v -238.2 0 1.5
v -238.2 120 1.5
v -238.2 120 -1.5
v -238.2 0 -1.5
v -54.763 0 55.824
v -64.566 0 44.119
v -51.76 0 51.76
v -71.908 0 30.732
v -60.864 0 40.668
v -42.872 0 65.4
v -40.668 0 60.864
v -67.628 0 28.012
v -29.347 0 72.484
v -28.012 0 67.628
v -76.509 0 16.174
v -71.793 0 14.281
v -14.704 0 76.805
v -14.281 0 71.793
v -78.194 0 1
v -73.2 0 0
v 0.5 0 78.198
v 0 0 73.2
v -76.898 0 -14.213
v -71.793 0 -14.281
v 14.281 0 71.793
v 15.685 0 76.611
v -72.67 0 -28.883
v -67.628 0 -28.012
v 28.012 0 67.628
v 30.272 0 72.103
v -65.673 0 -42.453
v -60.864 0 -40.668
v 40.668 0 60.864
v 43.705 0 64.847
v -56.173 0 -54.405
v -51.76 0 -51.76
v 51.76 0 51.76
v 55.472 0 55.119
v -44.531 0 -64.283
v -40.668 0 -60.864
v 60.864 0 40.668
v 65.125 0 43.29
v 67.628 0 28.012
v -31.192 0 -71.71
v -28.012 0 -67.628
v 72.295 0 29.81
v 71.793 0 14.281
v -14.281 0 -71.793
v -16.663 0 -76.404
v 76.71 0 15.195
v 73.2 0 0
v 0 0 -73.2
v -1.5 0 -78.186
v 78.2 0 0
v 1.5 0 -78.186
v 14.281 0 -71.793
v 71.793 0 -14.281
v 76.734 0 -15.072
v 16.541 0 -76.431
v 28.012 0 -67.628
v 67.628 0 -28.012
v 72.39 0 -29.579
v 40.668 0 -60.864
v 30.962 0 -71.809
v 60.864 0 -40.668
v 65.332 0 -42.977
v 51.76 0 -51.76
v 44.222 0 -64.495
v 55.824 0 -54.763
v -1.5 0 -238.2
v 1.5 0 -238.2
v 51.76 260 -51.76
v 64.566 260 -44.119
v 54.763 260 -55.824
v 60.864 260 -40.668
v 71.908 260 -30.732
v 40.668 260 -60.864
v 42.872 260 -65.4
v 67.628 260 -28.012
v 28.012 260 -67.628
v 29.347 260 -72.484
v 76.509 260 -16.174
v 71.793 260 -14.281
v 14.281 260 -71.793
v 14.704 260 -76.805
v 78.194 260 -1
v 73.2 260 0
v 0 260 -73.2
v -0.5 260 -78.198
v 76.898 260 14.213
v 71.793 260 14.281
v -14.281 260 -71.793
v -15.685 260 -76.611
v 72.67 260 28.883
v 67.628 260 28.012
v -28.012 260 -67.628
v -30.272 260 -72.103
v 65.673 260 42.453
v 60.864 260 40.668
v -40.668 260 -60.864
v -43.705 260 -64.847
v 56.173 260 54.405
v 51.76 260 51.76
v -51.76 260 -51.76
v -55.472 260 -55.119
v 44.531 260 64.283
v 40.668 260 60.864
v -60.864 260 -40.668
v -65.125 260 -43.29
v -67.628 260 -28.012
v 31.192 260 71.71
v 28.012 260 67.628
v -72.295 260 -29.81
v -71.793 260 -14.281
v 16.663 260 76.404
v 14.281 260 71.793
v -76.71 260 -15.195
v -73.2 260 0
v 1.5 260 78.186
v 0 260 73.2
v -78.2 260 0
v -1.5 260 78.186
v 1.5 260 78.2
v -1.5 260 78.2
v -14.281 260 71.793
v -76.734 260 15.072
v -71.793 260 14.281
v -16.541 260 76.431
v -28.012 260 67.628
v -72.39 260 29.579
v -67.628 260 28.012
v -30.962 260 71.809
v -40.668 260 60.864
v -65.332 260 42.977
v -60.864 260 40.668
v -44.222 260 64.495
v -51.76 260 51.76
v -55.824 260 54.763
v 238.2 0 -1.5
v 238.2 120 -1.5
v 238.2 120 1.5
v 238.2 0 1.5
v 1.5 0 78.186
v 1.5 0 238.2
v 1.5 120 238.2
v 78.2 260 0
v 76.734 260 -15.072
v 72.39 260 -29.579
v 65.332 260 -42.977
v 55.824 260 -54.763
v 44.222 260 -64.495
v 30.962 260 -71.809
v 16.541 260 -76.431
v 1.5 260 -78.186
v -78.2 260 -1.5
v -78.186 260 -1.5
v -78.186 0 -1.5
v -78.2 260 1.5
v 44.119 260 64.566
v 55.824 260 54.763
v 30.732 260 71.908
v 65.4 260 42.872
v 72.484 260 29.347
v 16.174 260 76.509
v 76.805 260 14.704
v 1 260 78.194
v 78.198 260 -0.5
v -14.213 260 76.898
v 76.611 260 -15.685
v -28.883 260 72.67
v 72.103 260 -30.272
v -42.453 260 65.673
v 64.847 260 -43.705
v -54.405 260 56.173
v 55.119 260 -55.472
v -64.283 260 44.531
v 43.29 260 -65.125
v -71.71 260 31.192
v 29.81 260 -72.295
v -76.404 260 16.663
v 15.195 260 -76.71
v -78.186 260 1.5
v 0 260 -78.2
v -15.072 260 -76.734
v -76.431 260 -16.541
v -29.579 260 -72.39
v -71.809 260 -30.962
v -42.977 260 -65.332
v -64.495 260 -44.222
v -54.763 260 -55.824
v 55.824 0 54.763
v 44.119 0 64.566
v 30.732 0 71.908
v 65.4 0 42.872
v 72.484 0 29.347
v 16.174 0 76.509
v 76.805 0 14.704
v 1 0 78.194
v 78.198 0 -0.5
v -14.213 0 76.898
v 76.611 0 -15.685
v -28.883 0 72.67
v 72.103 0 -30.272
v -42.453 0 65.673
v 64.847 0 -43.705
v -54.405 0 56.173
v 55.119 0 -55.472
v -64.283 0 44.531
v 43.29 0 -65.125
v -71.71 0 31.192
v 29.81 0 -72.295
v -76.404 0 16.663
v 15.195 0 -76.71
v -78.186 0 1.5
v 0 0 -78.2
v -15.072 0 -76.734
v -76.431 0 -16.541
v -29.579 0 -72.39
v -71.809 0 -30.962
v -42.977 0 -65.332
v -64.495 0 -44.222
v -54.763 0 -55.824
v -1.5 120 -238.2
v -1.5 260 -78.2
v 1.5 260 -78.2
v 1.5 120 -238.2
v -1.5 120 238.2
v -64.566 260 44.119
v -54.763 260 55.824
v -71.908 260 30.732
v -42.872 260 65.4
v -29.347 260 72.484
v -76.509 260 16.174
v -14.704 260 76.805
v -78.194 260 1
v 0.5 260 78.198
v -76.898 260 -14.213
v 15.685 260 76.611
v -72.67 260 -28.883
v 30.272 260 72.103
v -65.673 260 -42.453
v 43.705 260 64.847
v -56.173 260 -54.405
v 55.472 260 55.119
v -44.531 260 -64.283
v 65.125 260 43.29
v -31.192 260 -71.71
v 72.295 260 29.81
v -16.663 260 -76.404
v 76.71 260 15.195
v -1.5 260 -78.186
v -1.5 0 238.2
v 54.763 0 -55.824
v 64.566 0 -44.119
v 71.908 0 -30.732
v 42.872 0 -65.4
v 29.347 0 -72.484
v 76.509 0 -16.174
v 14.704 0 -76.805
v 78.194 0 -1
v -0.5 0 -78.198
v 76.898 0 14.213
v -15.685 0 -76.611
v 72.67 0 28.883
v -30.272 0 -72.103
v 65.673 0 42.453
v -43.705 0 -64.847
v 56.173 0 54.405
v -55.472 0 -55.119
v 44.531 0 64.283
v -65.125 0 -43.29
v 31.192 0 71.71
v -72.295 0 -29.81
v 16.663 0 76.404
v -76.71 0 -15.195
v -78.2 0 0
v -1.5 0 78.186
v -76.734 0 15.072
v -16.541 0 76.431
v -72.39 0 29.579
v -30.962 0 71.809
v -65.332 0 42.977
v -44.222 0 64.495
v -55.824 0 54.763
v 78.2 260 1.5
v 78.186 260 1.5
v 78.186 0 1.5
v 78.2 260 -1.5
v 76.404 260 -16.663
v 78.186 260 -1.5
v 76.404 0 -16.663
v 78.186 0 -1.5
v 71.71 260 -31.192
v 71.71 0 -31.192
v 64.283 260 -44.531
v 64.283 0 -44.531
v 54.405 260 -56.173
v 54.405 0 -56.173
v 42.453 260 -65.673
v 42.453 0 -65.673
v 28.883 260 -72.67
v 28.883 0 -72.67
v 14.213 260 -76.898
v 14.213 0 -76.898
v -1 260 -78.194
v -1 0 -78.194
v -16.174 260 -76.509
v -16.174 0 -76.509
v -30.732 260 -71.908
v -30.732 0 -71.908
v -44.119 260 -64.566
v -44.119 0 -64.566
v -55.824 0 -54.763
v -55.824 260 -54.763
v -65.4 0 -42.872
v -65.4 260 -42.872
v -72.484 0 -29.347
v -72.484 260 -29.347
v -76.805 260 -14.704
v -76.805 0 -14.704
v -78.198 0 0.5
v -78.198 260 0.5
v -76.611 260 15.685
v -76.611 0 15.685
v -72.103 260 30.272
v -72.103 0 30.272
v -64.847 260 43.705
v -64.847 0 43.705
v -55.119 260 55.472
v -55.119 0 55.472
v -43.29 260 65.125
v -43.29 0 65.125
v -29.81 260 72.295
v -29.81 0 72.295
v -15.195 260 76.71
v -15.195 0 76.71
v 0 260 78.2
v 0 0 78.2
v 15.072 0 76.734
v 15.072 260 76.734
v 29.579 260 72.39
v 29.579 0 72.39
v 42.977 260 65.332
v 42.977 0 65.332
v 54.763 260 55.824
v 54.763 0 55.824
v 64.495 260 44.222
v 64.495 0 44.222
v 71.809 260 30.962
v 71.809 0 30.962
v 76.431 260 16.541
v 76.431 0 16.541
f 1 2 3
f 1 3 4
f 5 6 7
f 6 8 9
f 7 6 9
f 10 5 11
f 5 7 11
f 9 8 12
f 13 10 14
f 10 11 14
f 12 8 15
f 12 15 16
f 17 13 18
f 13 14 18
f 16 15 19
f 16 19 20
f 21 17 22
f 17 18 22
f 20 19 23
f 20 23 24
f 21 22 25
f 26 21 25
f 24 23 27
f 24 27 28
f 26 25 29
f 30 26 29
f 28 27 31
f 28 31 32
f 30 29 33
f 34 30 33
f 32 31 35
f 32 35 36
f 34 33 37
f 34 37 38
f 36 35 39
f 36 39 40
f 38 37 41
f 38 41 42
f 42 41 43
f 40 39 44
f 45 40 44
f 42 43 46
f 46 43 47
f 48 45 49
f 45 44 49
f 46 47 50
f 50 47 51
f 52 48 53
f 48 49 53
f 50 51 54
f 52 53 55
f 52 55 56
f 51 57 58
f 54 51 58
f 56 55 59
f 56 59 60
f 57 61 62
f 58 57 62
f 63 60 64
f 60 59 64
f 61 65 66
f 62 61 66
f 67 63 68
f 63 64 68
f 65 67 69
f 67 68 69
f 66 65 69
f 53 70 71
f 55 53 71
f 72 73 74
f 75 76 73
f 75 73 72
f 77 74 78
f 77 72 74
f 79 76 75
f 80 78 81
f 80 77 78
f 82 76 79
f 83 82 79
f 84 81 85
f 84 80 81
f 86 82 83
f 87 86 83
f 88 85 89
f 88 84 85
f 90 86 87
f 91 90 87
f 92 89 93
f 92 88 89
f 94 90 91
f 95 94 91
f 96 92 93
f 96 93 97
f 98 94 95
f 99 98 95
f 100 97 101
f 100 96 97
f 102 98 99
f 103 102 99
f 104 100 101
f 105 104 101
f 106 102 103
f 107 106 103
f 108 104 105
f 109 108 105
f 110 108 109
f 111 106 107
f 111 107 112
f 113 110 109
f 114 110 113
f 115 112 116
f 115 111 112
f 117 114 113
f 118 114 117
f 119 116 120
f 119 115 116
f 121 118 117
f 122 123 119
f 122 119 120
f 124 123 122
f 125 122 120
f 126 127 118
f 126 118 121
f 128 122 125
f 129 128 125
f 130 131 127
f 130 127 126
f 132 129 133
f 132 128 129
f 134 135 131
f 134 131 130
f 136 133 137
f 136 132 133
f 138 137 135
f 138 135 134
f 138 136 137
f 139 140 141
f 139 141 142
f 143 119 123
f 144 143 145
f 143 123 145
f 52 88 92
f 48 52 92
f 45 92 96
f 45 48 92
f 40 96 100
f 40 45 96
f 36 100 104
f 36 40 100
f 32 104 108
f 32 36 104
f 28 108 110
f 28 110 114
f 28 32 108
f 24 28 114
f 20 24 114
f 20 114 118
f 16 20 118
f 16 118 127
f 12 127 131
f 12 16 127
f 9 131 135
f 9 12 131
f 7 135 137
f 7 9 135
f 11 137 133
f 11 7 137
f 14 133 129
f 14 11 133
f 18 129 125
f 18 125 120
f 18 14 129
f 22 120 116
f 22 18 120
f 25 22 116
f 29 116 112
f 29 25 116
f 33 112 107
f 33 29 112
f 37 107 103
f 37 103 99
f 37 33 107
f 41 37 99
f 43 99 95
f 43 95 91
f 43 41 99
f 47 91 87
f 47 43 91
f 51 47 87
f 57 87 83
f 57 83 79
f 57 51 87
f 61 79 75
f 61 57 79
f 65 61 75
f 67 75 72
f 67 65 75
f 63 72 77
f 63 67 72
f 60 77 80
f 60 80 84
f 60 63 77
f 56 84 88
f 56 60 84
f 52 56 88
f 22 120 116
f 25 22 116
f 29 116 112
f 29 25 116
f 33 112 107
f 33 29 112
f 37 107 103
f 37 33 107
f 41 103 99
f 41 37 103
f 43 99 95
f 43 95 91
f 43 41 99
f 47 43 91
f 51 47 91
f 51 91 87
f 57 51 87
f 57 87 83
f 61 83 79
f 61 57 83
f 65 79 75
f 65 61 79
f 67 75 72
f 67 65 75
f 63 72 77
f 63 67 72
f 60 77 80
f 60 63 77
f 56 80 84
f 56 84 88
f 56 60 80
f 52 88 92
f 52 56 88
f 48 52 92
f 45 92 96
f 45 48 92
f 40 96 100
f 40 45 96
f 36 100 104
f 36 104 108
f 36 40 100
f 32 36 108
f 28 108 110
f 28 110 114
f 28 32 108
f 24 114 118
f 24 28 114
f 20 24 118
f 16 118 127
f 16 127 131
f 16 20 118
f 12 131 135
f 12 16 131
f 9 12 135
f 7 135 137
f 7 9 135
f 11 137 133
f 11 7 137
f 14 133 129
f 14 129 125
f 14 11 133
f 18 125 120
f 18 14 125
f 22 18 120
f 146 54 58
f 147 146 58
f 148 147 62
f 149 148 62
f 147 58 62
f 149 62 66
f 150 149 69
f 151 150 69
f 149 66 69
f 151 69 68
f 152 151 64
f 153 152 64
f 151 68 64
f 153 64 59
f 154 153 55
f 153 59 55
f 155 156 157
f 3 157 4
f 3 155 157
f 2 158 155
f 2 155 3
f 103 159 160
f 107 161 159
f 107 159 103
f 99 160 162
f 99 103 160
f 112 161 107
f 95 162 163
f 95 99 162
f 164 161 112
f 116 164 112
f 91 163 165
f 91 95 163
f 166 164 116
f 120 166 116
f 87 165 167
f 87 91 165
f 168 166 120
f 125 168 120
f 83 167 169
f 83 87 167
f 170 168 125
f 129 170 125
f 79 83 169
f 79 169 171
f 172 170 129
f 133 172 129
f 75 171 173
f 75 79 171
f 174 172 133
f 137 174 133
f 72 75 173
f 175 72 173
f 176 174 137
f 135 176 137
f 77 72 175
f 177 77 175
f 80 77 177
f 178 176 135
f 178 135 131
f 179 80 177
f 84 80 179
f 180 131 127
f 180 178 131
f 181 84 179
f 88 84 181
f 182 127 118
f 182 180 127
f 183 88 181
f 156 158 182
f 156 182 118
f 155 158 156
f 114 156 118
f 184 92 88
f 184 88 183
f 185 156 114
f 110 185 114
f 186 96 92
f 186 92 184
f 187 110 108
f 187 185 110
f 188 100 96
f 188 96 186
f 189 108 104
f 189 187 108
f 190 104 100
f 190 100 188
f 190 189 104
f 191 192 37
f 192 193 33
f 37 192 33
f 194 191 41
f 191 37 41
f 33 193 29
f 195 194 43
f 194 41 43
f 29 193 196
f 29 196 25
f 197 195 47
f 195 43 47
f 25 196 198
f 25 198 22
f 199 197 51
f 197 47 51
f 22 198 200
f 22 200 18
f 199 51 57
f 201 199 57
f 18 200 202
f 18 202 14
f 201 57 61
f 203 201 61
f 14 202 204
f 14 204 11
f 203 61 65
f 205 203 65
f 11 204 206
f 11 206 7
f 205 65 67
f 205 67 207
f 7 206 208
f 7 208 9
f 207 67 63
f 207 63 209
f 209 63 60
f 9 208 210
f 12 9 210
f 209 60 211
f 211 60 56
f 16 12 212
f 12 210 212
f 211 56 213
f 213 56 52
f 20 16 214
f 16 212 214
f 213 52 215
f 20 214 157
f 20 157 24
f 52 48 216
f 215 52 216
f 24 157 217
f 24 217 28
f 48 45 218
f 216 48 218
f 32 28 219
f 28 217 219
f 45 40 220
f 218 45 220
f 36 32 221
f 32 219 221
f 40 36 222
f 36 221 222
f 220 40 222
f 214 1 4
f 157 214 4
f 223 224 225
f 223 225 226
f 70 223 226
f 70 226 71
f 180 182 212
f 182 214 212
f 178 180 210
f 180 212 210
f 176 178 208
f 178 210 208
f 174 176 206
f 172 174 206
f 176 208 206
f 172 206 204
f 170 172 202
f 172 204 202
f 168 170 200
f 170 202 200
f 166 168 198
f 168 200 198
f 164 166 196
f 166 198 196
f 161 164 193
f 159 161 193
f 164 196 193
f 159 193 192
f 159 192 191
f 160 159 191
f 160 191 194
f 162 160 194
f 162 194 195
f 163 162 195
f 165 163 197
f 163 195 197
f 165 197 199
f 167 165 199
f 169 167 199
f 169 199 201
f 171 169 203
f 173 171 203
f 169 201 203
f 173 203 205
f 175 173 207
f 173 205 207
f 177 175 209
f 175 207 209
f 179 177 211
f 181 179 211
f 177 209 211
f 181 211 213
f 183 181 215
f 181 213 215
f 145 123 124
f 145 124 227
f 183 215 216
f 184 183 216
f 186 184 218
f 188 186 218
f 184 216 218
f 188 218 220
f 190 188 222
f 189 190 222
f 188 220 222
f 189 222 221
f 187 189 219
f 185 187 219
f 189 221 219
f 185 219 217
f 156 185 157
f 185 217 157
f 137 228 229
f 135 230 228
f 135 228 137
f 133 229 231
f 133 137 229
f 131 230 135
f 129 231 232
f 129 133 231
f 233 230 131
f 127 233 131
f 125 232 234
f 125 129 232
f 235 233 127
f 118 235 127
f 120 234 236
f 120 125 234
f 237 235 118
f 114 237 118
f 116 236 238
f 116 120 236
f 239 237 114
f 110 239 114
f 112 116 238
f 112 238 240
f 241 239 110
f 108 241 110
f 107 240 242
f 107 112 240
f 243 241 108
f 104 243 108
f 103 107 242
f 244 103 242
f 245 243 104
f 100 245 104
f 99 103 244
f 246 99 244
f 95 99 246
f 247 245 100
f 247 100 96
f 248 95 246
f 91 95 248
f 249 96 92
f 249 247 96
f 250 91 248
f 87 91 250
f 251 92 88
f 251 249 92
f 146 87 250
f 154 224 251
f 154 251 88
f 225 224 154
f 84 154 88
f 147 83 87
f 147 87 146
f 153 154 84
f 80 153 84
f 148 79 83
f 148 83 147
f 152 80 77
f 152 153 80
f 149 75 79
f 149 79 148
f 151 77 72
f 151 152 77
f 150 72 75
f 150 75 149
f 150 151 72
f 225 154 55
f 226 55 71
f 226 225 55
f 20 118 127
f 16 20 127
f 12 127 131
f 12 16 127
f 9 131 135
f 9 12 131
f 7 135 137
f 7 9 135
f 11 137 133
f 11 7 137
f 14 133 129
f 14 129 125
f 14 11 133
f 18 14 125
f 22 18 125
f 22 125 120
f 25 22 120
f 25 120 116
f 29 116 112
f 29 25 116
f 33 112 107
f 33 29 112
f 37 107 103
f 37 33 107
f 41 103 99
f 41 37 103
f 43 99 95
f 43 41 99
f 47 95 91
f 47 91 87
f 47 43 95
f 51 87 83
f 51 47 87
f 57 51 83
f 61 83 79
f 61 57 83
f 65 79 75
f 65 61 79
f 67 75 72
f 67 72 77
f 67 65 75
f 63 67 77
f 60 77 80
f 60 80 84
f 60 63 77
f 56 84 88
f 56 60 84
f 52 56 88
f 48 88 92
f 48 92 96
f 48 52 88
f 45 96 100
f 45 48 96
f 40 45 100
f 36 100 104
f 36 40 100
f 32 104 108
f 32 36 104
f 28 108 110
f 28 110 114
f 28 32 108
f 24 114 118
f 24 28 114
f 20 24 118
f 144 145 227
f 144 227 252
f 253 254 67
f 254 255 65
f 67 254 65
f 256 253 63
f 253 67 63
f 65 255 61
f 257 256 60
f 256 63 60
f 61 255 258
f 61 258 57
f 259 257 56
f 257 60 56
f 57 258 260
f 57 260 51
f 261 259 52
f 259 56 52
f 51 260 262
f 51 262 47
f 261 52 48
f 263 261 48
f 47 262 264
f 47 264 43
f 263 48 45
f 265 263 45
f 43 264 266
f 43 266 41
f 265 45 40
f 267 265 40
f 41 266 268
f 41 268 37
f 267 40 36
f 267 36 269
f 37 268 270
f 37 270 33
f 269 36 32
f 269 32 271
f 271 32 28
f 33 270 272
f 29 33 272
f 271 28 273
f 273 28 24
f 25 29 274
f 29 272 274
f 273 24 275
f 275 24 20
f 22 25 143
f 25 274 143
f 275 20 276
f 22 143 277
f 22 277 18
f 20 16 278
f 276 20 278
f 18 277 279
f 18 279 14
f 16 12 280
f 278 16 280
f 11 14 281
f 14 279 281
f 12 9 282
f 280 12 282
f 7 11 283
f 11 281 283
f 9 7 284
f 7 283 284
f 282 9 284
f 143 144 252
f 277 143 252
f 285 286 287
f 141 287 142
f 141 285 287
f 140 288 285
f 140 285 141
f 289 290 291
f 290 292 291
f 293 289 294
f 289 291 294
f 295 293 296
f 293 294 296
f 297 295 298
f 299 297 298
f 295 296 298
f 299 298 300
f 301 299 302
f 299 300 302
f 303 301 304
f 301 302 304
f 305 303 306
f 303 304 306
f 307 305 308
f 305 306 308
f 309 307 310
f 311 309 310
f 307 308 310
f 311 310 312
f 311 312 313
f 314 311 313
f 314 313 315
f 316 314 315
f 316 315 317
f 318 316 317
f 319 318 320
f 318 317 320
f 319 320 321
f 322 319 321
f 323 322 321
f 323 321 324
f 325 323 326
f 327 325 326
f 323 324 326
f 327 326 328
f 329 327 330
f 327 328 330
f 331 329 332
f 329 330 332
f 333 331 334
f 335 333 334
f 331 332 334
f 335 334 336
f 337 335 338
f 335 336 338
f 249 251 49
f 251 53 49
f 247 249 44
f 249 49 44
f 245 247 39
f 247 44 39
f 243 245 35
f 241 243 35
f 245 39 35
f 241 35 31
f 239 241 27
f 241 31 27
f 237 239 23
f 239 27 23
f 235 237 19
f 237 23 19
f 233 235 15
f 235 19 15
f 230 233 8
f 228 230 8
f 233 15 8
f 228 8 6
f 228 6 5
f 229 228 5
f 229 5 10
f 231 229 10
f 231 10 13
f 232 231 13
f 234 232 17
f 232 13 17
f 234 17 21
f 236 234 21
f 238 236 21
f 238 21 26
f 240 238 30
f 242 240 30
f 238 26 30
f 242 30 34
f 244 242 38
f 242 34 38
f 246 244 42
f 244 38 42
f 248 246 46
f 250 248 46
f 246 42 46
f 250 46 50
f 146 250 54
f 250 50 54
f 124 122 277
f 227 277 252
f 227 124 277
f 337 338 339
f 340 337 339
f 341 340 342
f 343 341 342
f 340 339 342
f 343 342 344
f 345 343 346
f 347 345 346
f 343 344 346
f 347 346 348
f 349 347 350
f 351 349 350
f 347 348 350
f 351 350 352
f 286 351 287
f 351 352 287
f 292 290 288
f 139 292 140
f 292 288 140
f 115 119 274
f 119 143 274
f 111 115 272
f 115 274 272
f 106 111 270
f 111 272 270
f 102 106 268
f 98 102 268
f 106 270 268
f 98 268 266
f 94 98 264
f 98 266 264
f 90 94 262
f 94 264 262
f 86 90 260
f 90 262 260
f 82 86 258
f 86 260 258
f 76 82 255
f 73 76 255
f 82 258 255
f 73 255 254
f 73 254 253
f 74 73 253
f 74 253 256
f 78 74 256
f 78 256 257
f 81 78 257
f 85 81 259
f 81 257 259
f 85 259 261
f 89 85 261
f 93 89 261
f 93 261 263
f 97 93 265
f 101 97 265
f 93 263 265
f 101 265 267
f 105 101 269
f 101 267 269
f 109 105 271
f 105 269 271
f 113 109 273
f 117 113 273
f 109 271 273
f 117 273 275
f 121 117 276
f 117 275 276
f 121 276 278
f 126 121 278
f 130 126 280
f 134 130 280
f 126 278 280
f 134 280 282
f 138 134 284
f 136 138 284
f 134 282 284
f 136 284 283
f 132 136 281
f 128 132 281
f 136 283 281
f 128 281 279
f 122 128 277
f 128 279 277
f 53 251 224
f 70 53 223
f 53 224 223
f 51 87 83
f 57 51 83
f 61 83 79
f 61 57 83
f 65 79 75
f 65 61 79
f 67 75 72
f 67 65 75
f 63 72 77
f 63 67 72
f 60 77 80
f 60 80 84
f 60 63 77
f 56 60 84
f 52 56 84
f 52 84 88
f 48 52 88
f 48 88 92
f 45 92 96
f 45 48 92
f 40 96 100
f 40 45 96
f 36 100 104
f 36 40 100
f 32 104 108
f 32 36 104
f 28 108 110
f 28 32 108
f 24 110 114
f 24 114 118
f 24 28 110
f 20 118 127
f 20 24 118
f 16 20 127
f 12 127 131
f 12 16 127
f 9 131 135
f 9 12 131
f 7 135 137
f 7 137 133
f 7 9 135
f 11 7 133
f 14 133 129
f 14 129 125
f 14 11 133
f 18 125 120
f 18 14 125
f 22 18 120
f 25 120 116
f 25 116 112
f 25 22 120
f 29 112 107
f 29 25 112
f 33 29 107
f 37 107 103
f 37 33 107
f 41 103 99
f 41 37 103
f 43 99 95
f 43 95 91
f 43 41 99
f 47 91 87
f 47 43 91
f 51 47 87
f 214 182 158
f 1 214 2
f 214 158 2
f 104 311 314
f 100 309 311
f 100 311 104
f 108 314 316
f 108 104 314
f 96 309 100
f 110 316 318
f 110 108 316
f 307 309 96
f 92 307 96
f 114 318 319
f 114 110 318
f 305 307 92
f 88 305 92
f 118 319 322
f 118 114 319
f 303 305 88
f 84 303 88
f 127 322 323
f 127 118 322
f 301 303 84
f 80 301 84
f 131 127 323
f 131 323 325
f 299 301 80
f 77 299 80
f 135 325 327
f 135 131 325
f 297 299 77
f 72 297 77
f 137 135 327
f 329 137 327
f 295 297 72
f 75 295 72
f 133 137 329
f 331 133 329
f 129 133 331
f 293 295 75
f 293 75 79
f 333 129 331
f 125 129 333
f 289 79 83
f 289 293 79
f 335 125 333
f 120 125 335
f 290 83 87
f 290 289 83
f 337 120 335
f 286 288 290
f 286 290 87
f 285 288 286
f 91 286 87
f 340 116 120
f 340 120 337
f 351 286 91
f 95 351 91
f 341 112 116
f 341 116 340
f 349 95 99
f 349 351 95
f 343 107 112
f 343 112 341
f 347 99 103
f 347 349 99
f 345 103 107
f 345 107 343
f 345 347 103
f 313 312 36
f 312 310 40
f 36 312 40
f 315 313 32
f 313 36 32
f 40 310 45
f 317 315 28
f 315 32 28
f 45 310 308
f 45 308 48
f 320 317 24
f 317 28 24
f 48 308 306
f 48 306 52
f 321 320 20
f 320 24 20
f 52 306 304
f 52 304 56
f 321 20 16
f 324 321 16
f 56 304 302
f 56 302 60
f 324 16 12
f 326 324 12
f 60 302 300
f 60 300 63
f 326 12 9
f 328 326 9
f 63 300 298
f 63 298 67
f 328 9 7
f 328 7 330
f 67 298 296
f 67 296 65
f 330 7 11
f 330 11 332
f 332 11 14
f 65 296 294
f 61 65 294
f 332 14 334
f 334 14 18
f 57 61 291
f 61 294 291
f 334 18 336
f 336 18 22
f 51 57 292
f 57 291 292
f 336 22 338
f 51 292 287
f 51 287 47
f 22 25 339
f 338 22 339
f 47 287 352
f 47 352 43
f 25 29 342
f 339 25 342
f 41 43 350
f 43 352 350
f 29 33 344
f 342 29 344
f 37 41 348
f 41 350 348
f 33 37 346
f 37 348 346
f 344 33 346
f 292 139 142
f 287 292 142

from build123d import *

# Parameters (mm, degrees)
SKETCH1_R                = 78.2
SKETCH1_R_2              = 73.2
BOSS_EXTRUDE1_DEPTH      = 260
BOSS_EXTRUDE2_DEPTH      = 1.5
BOSS_EXTRUDE2_DEPTH_BACK = 1.5
BOSS_EXTRUDE3_DEPTH      = 1.5
BOSS_EXTRUDE3_DEPTH_BACK = 1.5
SKETCH4_W                = 2
SKETCH4_H                = 260
CIRPATTERN1_COUNT        = 4


with BuildPart() as part:
    # Sketch1 → Boss-Extrude1 (new body)
    with BuildSketch(Plane(origin=(0, 0, 0), x_dir=(1, 0, 0), z_dir=(0, 1, 0))):
        Circle(SKETCH1_R)
        Circle(SKETCH1_R_2, mode=Mode.SUBTRACT)
    extrude(amount=BOSS_EXTRUDE1_DEPTH)



with BuildPart() as body_2:
    # Sketch2 → Boss-Extrude2 (new, two sides: drawn at the far end of the back side and taken through both)
    with BuildSketch(Plane.XY.offset(-BOSS_EXTRUDE2_DEPTH_BACK)):
        Polygon((78.2, 0), (78.2, 260), (238.2, 120), (238.2, 0), align=None)
    extrude(amount=BOSS_EXTRUDE2_DEPTH + BOSS_EXTRUDE2_DEPTH_BACK)


with BuildPart() as part_1:
    add(part.part)

    add(body_2.part)  # Boss-Extrude3 merges body 2
    # Sketch4 → Boss-Extrude3 (add, two sides: drawn at the far end of the back side and taken through both)
    with BuildSketch(Plane.XY.offset(-BOSS_EXTRUDE3_DEPTH_BACK)):
        with Locations((77.2, 130)):
            Rectangle(SKETCH4_W, SKETCH4_H)
    extrude(amount=BOSS_EXTRUDE3_DEPTH + BOSS_EXTRUDE3_DEPTH_BACK)


with BuildPart() as cirpattern1_1:
    # CirPattern1: pattern copy
    add(part_1.part.rotate(Axis((0, 260, 0), (0, -1, 0)), 1 * 360 / CIRPATTERN1_COUNT))


with BuildPart() as cirpattern1_2:
    # CirPattern1: pattern copy
    add(part_1.part.rotate(Axis((0, 260, 0), (0, -1, 0)), 2 * 360 / CIRPATTERN1_COUNT))


with BuildPart() as cirpattern1_3:
    # CirPattern1: pattern copy
    add(part_1.part.rotate(Axis((0, 260, 0), (0, -1, 0)), 3 * 360 / CIRPATTERN1_COUNT))


solid = Compound([part_1.part, cirpattern1_1.part, cirpattern1_2.part, cirpattern1_3.part])
